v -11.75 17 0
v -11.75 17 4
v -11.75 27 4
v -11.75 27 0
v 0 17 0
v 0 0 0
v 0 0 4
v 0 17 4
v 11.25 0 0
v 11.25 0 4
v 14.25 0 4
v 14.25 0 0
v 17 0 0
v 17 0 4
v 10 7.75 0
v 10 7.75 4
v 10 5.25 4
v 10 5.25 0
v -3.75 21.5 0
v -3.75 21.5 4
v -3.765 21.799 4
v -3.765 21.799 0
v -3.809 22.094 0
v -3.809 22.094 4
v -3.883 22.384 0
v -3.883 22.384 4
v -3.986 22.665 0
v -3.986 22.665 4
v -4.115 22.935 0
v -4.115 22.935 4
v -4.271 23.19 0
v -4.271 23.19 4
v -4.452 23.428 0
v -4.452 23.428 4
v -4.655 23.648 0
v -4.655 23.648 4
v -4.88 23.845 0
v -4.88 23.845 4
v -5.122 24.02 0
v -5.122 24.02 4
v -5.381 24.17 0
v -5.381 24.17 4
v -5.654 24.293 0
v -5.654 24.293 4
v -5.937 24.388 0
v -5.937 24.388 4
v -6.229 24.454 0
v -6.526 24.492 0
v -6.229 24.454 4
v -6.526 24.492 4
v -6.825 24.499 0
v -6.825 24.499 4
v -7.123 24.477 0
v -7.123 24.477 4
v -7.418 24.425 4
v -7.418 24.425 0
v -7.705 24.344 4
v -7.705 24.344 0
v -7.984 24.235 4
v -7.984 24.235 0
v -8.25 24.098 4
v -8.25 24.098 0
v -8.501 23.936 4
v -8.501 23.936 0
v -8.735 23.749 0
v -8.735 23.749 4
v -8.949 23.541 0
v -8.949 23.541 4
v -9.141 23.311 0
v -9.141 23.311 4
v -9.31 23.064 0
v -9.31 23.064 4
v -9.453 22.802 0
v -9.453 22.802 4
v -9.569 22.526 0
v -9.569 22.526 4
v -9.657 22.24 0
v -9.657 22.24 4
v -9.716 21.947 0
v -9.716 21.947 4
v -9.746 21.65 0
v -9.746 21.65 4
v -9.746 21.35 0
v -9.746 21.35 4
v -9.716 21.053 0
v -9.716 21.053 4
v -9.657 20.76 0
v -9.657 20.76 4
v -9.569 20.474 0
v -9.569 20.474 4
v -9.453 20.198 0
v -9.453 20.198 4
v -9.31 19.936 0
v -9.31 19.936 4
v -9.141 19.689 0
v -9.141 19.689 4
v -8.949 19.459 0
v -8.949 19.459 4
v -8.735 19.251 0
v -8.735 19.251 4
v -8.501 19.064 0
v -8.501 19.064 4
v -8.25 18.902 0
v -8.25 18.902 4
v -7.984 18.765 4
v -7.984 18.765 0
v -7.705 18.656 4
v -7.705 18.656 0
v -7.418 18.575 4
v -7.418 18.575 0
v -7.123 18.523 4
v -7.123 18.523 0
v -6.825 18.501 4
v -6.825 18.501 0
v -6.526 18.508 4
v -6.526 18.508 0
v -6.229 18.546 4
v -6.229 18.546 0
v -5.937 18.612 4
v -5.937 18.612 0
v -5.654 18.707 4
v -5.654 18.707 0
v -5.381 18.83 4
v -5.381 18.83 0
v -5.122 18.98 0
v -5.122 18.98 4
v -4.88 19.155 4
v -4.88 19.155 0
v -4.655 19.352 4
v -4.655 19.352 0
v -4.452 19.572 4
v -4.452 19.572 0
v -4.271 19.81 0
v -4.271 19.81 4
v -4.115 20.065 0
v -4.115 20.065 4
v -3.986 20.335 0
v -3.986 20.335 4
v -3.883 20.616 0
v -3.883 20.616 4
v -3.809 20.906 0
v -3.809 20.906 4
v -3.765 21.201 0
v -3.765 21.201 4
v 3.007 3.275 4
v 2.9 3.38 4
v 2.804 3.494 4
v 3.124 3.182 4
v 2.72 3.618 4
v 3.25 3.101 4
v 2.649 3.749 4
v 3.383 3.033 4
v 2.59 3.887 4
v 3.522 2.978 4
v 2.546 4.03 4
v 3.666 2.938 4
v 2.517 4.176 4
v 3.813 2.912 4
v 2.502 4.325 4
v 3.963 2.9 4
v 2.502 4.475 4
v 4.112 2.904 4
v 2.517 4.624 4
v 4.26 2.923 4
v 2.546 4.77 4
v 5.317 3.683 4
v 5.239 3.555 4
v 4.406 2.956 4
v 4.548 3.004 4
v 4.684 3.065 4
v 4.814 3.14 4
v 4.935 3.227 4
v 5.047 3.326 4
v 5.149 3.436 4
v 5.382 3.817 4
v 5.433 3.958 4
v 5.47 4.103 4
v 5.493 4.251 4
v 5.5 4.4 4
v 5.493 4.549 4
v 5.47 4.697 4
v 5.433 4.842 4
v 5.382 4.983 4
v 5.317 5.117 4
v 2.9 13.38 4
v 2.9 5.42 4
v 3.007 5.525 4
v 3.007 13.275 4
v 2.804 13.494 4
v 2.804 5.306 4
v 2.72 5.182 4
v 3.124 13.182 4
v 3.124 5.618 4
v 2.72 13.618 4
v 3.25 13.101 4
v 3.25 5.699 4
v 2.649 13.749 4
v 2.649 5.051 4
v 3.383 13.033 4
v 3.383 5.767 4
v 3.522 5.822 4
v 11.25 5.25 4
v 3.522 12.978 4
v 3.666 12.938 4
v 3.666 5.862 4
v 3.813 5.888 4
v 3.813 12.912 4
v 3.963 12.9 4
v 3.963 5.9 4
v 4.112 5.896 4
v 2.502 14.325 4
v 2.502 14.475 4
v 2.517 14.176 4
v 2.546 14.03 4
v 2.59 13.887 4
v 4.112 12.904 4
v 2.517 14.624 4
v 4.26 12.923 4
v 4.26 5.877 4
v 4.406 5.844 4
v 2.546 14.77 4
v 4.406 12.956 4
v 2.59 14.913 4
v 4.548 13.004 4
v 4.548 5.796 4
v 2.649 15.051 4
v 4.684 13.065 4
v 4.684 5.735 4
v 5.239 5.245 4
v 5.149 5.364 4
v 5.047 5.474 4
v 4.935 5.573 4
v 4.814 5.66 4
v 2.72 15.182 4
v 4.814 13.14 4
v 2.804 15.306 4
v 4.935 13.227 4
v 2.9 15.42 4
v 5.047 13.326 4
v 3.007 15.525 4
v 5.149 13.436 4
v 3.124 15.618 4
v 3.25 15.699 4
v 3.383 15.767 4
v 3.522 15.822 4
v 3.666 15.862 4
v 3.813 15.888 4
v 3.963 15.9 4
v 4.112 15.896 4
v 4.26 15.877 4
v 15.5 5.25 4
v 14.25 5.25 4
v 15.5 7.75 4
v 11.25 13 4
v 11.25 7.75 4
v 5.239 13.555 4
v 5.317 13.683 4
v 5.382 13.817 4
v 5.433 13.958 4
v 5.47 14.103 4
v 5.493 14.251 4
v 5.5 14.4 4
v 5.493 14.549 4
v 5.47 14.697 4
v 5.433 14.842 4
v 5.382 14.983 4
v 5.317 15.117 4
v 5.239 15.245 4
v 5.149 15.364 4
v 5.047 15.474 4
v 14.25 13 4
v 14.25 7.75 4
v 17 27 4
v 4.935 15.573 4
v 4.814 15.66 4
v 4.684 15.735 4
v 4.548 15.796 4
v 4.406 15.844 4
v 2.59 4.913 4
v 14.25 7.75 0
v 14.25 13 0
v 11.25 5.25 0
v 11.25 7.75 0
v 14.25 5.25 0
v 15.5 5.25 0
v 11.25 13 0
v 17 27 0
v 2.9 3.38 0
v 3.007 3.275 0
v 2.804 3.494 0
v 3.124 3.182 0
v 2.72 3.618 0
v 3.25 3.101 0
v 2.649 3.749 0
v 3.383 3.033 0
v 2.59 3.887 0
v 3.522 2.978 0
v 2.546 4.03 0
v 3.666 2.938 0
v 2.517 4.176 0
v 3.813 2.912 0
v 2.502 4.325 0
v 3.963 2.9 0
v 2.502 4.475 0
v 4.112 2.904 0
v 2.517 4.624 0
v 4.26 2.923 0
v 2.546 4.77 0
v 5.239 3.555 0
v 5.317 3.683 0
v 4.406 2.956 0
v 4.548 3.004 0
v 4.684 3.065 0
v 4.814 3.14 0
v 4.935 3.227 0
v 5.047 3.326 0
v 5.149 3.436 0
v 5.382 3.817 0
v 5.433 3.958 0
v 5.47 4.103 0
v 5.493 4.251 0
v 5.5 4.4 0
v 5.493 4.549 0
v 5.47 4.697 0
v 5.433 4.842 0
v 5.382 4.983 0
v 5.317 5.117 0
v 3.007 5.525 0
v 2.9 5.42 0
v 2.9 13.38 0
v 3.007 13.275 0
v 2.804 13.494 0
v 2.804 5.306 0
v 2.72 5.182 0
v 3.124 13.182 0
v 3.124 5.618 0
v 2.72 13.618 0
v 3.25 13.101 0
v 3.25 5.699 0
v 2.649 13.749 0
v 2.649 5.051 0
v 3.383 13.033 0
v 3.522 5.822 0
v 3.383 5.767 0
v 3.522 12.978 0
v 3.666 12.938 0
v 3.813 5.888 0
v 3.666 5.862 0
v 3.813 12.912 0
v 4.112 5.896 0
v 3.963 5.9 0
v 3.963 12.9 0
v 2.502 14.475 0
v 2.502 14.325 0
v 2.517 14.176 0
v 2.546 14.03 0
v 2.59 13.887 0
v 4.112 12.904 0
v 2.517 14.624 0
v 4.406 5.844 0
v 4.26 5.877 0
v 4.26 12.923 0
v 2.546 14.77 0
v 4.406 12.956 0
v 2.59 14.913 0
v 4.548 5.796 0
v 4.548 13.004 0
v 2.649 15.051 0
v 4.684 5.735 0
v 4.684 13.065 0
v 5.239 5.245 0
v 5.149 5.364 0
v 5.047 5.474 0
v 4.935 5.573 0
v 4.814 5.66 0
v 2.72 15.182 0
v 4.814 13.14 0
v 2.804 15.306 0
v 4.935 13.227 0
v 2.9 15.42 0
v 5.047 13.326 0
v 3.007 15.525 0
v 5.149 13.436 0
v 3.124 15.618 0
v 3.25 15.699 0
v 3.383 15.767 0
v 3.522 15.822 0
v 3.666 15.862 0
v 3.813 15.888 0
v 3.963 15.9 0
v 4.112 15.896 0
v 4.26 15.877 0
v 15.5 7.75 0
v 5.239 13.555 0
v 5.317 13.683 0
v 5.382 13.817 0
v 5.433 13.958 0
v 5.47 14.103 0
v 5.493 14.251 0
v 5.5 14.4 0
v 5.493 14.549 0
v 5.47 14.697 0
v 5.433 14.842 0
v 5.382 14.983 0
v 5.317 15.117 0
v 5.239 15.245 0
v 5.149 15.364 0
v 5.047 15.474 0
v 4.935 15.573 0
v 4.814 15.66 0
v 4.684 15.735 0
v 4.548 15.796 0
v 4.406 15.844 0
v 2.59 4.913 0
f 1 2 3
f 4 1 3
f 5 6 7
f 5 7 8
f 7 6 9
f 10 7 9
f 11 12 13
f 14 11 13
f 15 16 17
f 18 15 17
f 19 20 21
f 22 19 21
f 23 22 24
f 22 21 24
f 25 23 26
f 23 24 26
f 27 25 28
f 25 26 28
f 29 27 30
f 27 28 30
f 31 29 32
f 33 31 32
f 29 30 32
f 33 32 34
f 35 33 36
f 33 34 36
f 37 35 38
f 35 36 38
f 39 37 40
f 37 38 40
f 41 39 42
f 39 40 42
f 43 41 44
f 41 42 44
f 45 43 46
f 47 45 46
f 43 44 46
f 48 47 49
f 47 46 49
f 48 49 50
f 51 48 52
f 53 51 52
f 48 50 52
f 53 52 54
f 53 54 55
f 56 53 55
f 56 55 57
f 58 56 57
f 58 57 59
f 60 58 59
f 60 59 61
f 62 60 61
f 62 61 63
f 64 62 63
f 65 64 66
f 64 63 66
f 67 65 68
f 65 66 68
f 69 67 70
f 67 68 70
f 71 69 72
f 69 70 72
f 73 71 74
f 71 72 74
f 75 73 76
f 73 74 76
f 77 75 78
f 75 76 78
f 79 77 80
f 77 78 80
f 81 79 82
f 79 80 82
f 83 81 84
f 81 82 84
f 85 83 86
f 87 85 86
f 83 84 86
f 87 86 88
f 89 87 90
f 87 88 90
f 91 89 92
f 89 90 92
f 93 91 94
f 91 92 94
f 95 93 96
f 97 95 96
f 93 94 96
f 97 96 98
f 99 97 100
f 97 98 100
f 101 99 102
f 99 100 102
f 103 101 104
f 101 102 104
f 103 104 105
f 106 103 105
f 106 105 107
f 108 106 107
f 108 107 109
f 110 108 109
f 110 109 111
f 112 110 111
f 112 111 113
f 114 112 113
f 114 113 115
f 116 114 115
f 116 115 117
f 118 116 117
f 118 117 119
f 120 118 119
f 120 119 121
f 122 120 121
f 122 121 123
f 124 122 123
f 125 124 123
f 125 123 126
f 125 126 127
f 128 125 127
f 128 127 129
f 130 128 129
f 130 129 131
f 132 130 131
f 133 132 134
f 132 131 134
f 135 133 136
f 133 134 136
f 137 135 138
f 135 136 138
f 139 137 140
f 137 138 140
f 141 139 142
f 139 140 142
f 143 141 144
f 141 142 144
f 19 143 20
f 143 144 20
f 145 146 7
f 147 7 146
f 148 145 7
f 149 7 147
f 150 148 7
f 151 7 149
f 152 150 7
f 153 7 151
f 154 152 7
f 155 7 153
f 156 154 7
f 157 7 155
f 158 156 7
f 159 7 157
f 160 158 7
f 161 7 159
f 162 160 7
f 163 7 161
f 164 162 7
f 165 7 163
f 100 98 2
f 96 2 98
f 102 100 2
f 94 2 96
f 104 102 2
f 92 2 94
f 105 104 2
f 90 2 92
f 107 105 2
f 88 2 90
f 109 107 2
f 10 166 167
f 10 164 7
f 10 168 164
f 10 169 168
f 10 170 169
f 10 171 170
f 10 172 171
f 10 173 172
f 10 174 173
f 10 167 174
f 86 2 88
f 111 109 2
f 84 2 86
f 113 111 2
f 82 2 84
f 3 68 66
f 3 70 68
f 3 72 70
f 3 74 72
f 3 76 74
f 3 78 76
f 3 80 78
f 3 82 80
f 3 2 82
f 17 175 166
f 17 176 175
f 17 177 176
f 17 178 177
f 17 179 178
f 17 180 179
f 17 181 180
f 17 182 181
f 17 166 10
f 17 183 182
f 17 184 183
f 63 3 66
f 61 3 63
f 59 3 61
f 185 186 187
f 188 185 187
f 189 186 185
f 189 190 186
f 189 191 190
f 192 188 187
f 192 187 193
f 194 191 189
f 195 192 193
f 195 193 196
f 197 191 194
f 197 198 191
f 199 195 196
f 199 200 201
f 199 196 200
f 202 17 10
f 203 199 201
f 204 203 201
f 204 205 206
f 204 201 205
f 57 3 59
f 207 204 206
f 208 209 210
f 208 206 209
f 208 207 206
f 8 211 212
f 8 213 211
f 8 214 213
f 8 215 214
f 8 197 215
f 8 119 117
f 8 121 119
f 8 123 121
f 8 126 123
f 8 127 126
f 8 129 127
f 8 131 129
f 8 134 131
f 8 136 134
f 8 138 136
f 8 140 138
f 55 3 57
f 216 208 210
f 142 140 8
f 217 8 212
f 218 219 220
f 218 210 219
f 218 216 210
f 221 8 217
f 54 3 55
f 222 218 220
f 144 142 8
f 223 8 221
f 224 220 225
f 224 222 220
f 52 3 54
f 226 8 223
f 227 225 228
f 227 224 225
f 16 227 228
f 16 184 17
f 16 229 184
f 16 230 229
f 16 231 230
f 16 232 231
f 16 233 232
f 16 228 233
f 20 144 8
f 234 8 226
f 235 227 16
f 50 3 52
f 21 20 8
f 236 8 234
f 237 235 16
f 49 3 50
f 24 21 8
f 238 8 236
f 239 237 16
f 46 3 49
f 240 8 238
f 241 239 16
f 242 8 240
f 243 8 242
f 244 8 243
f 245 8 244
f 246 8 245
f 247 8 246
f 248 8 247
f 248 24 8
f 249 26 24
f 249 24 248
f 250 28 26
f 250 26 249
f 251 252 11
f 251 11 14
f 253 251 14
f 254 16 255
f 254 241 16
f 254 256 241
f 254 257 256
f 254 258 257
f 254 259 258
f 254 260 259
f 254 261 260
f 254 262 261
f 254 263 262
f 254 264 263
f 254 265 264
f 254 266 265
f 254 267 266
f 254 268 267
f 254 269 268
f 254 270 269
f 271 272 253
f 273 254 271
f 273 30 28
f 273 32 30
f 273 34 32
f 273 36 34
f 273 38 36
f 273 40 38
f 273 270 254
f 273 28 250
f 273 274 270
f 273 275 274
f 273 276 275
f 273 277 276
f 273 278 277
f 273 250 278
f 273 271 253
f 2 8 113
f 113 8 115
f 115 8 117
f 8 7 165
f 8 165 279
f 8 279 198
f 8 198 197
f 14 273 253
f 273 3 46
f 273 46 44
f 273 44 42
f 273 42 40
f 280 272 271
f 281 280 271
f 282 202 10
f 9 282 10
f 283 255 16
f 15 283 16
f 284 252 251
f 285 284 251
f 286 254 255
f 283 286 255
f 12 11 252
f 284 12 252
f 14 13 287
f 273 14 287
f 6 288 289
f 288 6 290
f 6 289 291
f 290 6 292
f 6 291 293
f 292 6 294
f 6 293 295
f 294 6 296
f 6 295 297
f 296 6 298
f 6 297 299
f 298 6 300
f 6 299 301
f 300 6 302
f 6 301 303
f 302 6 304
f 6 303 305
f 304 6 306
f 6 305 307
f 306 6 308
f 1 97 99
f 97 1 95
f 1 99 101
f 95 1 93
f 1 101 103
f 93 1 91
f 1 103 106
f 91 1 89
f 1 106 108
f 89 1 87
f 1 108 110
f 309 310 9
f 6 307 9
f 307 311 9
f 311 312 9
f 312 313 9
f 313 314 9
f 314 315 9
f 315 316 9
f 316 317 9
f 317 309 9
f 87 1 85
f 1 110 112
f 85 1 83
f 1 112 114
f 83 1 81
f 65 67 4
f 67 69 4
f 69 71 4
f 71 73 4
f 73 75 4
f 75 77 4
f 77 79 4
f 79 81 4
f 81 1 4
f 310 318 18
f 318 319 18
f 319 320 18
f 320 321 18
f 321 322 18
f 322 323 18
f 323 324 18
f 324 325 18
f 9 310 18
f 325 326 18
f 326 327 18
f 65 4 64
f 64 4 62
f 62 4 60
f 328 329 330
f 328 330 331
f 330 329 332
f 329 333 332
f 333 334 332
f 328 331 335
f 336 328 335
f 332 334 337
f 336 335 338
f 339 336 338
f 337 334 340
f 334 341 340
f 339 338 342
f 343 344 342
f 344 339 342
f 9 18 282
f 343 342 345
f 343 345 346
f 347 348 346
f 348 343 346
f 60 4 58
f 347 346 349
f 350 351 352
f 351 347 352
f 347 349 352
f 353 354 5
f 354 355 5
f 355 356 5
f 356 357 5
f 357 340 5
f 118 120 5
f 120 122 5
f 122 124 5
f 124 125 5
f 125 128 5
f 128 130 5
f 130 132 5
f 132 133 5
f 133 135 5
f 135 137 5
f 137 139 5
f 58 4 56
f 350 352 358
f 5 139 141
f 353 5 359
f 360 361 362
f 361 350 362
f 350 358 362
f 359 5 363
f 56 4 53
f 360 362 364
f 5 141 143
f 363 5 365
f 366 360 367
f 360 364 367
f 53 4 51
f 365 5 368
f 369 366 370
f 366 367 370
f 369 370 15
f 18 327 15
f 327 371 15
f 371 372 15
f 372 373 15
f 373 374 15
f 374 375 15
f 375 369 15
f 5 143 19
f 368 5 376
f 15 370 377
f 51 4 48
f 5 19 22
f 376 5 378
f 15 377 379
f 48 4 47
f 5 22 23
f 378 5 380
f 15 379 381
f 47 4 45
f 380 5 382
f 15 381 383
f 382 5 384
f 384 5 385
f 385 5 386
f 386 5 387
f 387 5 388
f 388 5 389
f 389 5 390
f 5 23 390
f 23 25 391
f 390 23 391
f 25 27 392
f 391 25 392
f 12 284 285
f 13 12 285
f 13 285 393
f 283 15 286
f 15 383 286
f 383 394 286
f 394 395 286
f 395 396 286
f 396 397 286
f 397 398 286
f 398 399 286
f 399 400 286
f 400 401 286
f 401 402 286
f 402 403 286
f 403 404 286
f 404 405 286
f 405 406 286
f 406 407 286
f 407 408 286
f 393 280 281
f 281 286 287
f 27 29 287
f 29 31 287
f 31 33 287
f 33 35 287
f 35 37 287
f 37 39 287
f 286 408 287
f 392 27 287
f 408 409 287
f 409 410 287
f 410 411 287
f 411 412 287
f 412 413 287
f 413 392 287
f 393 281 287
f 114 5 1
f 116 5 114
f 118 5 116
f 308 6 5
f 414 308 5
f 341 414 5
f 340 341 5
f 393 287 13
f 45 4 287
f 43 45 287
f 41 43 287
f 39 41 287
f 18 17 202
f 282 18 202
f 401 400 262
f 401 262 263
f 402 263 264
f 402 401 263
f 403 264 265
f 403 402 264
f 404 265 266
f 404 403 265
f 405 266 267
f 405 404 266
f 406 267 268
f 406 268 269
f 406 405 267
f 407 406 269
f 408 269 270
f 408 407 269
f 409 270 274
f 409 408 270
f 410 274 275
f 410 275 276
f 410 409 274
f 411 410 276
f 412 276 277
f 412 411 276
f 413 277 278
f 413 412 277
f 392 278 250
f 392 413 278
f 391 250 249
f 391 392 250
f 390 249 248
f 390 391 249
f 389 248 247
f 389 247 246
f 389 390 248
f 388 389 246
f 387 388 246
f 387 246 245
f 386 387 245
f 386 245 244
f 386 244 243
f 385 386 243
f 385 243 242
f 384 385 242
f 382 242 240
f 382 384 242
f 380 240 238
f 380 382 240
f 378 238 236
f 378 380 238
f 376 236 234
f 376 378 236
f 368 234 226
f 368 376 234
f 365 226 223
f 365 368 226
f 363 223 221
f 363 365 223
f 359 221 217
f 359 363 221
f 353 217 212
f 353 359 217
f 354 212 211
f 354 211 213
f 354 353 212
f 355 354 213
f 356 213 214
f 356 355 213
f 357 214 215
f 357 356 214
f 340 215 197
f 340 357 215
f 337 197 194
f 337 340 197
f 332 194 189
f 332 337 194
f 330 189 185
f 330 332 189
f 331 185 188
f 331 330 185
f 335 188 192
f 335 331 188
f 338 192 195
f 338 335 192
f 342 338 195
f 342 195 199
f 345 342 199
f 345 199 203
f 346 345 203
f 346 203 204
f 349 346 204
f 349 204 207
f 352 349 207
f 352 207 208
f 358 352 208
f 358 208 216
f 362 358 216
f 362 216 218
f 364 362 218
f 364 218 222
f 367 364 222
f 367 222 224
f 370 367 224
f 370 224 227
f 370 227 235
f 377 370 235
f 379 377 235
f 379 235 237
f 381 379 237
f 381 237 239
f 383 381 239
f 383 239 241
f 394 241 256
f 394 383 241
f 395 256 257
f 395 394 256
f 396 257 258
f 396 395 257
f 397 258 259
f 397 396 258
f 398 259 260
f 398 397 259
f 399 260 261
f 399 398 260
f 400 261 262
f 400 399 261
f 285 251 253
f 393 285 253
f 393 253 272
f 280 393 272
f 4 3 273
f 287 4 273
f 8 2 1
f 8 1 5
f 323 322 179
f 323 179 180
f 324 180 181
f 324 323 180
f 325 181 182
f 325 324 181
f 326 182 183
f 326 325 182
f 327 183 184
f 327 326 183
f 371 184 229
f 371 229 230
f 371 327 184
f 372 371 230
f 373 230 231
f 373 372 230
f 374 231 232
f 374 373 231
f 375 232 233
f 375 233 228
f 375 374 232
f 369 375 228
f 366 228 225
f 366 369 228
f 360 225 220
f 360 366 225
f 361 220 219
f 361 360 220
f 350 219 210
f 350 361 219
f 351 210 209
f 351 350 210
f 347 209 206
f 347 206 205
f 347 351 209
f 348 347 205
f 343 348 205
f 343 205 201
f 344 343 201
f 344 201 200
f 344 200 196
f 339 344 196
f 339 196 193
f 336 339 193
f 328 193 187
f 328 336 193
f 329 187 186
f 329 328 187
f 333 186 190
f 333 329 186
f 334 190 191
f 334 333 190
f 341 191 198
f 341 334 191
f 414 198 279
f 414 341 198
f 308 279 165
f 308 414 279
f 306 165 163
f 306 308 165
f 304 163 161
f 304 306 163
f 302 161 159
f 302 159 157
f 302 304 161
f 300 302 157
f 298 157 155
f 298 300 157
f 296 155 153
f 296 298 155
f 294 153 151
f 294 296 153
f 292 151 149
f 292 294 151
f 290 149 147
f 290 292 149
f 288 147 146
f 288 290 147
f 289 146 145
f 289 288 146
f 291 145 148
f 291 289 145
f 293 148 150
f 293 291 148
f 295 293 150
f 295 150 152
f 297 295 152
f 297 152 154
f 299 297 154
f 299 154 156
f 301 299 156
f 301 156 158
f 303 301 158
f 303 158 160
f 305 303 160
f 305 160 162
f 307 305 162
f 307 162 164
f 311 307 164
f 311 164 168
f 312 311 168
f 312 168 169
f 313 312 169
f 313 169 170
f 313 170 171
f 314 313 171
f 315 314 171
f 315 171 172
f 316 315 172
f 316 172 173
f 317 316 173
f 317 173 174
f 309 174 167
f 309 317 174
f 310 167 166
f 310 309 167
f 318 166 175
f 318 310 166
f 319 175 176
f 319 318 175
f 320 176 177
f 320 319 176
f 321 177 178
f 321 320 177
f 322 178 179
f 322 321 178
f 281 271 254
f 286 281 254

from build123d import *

# Parameters (mm, degrees)
SKETCH_1_W               = 17
SKETCH_1_H               = 27
SKETCH_1_R               = 1.5
EXTRUDE_1_DEPTH          = 4
CUT_EXTRUDE_1_DEPTH      = 1
CUT_EXTRUDE_1_DEPTH_BACK = 4
SKETCH_5_W               = 11.75
SKETCH_5_H               = 10
SKETCH_5_R               = 3
EXTRUDE_2_DEPTH          = 4


with BuildPart() as part:
    # Эскиз1 → Бобышка-Вытянуть1 (new body)
    with BuildSketch(Plane.XY):
        with Locations((8.5, 13.5)):
            Rectangle(SKETCH_1_W, SKETCH_1_H)
        with Locations((4, 14.4)):
            Circle(SKETCH_1_R, mode=Mode.SUBTRACT)
        with Locations((4, 4.4)):
            Circle(SKETCH_1_R, mode=Mode.SUBTRACT)
    extrude(amount=EXTRUDE_1_DEPTH)

    # Эскиз2 → Вырез-Вытянуть1 (cut, two sides)
    with BuildSketch(Plane.XY.offset(4)) as cut_extrude_1_sk:
        Polygon((11.25, 5.25), (11.25, 0), (14.25, 0), (14.25, 5.25), (15.5, 5.25), (15.5, 7.75), (14.25, 7.75), (14.25, 13), (11.25, 13), (11.25, 7.75), (10, 7.75), (10, 5.25), align=None)
    extrude(amount=CUT_EXTRUDE_1_DEPTH, mode=Mode.SUBTRACT)
    extrude(cut_extrude_1_sk.sketch, amount=-CUT_EXTRUDE_1_DEPTH_BACK, mode=Mode.SUBTRACT)

    # Эскиз5 → Бобышка-Вытянуть2 (add)
    with BuildSketch(Plane.XY.offset(4)):
        with Locations((-5.875, 22)):
            Rectangle(SKETCH_5_W, SKETCH_5_H)
        with Locations((-6.75, 21.5)):
            Circle(SKETCH_5_R, mode=Mode.SUBTRACT)
    extrude(amount=-EXTRUDE_2_DEPTH)


solid = part.part
